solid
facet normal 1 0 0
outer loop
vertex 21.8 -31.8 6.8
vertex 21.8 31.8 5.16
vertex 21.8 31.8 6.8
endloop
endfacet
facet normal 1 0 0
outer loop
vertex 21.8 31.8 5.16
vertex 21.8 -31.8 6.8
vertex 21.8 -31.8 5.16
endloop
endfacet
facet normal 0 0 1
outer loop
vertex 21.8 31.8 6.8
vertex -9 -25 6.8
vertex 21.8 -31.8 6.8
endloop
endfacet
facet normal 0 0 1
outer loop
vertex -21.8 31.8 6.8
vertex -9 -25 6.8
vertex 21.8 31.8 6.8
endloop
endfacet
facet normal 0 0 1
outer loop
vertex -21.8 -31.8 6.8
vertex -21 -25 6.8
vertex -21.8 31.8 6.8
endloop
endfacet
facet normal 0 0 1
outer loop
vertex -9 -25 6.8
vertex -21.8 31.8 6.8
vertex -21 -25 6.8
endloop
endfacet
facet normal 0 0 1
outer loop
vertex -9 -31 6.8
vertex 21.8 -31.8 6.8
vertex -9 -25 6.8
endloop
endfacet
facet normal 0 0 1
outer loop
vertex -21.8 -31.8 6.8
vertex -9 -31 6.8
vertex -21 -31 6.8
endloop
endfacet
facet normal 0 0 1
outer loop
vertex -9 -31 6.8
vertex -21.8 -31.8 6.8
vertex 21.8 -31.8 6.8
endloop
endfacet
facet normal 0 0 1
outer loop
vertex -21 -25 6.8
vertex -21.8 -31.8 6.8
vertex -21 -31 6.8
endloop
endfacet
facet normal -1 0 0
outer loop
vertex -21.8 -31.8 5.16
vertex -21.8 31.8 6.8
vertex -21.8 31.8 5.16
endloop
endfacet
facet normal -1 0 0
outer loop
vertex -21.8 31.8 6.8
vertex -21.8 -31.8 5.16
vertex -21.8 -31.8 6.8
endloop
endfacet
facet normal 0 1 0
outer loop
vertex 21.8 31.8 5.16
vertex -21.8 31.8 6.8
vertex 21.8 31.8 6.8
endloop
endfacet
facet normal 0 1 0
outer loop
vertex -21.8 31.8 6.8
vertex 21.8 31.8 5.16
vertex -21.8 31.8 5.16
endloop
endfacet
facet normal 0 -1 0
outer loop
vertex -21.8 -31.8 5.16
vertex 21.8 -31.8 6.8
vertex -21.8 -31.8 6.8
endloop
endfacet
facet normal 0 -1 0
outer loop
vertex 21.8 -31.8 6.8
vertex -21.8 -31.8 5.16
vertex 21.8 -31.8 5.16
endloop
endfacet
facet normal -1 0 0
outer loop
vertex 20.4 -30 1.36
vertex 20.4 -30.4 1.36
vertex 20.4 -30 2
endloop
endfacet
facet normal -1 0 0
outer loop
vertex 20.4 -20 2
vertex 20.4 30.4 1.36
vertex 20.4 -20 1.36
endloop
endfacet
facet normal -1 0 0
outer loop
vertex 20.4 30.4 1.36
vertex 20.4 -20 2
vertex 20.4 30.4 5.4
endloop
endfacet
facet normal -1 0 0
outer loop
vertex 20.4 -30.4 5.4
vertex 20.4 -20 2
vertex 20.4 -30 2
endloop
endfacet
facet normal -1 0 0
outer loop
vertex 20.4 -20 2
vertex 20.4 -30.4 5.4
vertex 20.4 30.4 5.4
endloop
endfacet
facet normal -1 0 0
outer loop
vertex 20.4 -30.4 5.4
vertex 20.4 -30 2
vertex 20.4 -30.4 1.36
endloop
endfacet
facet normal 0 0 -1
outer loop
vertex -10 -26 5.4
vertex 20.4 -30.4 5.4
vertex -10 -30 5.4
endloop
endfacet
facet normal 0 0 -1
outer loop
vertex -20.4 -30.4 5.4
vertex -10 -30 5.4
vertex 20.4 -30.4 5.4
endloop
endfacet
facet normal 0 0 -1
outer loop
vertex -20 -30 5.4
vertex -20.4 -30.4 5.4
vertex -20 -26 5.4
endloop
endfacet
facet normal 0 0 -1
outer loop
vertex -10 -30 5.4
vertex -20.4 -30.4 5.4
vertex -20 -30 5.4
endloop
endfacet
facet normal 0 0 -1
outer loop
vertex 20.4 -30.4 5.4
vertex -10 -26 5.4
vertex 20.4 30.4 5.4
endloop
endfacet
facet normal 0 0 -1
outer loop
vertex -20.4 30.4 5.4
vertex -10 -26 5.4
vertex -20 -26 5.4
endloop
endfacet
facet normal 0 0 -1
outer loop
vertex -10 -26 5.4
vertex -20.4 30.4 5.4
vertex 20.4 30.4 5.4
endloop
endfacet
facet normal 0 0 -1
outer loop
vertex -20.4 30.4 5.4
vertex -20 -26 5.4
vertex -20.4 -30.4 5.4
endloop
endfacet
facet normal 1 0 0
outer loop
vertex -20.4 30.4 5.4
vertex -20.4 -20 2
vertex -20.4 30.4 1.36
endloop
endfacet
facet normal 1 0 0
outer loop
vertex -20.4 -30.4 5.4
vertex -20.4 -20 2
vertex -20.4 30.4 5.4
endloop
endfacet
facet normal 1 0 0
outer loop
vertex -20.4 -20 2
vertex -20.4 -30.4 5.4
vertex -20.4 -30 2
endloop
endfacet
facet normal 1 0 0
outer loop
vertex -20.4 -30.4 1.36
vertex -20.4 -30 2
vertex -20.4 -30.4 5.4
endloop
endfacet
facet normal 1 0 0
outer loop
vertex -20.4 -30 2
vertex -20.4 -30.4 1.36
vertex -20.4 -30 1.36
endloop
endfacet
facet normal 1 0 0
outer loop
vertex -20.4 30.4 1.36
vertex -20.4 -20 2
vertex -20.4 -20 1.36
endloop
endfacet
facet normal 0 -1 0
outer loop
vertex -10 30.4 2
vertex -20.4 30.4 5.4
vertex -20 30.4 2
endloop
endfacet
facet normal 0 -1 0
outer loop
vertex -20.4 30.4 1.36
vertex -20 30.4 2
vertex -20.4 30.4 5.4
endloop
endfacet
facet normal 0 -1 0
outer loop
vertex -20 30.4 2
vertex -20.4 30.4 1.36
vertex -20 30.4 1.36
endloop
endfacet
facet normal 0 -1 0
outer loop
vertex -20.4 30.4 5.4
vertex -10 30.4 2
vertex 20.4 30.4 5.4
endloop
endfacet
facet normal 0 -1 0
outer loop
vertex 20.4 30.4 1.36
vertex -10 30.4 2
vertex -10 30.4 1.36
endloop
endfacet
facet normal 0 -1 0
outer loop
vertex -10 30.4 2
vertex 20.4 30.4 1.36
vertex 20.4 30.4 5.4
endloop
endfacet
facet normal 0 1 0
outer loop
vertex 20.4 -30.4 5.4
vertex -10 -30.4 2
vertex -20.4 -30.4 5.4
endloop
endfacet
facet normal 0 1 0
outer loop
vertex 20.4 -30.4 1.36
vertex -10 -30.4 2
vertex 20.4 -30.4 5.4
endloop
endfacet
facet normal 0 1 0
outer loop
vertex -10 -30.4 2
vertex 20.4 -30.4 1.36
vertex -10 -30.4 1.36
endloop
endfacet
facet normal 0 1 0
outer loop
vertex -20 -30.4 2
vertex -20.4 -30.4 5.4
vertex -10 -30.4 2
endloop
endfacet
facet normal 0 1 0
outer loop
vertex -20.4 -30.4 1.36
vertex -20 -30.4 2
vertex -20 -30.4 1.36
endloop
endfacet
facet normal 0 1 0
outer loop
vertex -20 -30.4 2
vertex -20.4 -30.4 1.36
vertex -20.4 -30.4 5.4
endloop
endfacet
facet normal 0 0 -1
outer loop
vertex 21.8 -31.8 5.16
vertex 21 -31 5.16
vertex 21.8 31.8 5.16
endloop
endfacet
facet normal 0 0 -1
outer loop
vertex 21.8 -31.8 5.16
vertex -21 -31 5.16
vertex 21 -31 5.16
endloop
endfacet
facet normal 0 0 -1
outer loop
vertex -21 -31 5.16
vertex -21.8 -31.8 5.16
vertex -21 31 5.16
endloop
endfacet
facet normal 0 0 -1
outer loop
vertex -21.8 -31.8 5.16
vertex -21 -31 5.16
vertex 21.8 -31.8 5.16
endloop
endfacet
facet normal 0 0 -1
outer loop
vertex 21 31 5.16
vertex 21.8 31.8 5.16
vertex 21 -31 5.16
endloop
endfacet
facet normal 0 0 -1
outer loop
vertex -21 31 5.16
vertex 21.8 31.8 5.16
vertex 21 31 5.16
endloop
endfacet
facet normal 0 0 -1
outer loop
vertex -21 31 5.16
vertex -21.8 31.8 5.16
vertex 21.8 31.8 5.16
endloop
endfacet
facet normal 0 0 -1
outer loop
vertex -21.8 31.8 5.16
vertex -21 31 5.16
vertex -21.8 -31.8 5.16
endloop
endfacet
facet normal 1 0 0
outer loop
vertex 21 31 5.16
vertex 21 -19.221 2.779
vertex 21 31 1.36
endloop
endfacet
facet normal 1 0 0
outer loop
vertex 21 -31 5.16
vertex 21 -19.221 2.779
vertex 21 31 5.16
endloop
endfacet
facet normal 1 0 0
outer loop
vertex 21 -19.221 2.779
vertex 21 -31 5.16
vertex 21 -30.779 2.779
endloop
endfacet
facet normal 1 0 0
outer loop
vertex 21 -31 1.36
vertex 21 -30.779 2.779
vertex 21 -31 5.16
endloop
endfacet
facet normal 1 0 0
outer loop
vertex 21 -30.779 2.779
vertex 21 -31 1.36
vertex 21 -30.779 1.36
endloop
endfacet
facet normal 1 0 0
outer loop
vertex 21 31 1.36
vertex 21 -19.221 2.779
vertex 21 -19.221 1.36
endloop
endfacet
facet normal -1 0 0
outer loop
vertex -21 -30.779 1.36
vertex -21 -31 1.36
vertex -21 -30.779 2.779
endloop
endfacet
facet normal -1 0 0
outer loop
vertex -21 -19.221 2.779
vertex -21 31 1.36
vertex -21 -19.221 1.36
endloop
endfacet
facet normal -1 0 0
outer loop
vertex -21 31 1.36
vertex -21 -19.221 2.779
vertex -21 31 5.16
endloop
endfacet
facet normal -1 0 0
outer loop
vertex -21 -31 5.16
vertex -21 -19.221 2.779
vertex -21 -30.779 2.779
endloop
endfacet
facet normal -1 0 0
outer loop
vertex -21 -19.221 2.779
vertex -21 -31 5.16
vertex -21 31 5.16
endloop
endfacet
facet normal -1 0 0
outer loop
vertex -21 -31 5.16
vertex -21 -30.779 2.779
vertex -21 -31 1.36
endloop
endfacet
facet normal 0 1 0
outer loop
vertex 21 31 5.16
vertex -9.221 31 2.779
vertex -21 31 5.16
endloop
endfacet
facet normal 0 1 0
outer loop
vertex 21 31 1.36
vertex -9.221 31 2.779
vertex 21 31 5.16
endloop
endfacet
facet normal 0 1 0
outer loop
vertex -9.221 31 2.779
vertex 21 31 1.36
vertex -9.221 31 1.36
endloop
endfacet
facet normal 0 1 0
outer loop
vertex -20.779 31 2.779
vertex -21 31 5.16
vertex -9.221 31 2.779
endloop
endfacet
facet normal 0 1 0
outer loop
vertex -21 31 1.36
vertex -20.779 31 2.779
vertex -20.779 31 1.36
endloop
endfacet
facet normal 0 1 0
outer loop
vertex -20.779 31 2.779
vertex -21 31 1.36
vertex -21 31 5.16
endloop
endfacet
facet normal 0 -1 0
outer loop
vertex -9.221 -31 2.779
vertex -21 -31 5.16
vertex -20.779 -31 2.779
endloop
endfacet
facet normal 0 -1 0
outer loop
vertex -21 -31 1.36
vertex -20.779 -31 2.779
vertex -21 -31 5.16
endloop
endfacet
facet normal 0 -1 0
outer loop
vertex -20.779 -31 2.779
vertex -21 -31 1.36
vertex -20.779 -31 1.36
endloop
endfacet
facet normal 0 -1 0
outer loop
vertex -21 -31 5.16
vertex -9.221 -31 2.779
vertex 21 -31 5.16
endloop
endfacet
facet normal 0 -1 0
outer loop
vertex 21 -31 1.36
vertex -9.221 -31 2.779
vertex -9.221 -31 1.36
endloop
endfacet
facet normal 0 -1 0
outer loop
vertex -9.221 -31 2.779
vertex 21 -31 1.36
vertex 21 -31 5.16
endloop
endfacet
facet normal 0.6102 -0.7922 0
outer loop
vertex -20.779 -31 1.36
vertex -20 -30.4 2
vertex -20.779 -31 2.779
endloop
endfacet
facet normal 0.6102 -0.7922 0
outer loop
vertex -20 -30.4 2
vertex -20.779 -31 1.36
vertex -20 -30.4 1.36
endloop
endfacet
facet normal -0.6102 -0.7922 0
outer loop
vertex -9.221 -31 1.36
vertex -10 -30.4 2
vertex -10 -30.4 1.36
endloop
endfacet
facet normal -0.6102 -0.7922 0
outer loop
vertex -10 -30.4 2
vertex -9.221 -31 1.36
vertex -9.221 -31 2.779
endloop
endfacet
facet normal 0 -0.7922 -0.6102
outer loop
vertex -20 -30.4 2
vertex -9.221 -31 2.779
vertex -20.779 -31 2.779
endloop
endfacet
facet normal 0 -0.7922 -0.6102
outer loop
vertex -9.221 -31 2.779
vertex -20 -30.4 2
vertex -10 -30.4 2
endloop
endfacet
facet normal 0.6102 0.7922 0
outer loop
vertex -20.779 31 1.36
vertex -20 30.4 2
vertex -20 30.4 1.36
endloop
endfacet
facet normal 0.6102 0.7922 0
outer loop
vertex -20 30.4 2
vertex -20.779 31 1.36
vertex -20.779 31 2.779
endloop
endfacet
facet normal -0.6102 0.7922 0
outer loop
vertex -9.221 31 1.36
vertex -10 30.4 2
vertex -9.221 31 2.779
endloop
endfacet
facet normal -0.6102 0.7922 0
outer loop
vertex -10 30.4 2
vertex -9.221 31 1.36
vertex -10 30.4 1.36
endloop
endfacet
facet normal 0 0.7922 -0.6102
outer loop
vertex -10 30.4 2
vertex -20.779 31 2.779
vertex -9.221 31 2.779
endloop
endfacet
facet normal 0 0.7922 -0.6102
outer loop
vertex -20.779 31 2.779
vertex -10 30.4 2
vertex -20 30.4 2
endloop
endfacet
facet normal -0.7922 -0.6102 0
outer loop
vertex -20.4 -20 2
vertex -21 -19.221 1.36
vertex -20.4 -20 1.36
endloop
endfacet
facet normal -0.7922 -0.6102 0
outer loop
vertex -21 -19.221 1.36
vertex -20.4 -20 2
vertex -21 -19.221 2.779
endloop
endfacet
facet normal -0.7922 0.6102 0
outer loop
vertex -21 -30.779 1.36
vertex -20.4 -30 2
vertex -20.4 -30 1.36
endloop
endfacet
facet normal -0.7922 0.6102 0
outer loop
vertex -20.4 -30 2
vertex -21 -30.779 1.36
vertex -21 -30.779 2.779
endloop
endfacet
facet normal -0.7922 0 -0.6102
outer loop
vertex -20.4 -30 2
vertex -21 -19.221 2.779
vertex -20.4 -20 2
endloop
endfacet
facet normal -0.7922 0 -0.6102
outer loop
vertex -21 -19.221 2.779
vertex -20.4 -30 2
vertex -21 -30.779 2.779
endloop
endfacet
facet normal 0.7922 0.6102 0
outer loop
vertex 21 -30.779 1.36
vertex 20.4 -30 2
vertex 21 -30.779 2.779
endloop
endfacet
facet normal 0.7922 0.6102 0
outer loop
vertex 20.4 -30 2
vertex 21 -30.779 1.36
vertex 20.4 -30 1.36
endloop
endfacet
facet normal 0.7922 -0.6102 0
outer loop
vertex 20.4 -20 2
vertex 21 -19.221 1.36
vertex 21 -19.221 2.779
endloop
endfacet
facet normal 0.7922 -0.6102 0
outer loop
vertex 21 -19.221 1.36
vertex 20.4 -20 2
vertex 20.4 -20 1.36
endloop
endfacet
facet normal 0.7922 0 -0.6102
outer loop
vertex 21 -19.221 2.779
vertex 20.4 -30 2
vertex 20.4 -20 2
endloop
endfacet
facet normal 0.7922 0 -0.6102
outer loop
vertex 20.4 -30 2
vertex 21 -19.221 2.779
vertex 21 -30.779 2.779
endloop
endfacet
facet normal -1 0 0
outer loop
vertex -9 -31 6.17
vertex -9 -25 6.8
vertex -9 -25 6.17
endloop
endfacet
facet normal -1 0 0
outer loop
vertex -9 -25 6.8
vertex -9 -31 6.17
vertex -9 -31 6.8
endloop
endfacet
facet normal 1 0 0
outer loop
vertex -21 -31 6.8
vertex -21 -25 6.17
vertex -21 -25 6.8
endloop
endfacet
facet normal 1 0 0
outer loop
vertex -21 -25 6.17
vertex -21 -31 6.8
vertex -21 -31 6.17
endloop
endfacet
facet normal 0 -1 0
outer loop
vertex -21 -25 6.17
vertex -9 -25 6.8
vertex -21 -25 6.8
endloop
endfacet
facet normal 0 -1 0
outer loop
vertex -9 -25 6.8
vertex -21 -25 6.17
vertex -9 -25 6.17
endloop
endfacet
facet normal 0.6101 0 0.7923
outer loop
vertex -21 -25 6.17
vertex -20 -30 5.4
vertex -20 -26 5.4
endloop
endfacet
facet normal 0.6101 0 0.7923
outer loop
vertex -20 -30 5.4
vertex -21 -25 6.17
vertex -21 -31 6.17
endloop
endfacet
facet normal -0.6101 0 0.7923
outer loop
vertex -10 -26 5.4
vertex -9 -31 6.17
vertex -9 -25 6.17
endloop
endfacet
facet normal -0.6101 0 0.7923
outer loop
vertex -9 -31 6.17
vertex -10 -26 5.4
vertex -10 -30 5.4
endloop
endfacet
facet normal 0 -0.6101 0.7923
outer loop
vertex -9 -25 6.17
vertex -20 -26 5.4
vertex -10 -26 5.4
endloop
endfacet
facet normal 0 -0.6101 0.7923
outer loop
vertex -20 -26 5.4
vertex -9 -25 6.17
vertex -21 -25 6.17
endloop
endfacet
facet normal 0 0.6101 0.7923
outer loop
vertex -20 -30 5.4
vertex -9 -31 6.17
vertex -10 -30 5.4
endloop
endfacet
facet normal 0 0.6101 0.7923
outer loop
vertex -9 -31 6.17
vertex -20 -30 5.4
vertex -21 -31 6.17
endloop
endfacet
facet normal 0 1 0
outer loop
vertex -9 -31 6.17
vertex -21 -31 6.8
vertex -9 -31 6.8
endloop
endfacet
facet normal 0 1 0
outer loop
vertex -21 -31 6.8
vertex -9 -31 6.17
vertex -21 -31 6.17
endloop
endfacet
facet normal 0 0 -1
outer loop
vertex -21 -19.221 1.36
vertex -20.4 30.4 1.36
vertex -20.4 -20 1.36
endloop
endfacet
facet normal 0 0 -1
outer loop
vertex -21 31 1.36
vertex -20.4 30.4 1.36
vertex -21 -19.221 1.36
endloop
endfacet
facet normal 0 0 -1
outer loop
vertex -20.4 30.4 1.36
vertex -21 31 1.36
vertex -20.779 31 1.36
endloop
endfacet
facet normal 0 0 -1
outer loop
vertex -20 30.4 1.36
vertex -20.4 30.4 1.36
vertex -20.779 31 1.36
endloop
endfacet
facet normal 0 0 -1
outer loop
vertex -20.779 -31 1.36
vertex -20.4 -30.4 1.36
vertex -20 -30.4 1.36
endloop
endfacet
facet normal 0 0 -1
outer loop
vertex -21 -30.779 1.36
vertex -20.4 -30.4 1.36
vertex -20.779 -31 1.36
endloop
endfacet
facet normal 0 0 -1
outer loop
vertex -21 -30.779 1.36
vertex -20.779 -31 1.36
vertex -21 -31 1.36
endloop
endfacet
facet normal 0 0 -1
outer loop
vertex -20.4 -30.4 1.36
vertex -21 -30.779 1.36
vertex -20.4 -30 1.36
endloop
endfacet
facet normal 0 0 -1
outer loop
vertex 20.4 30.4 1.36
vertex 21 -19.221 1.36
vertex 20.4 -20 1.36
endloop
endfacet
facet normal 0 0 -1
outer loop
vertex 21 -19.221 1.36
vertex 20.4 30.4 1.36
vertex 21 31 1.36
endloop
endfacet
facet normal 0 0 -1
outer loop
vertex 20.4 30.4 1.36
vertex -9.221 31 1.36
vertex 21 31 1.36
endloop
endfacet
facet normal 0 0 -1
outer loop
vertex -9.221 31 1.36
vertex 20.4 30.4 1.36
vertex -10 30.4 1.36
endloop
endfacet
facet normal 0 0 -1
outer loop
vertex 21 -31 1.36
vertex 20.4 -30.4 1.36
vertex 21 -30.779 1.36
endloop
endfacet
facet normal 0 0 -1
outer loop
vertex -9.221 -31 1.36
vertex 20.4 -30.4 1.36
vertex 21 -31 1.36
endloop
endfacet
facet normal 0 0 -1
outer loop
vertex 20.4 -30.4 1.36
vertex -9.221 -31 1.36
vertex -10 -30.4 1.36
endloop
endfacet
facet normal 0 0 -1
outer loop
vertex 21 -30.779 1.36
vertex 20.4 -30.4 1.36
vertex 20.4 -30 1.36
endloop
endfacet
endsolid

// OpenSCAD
// file: parameterized_box.scad
$fn = 16;

/*
// Wall thickness
WALL    = 2;

// Object dimensions
OBJECT  = [40,60,10];

// Distance between Object and Wall
PADDING = [0.4,0.4,0.4]; 

// Ratio between cover and case
COVER_RATIO = 0.3;

// Height of the rim
RIM_HEIGHT = 4;

// Gap for the Rim
RIM_GAP = 0.2;

// Radius of mountholes
MNT_RADIUS = 1.5;

// X/Y distance from wall for mountholes
MNT_LOC_X = 3;
MNT_LOC_Y = 3;

// Mount hole height
MNT_HEIGHT = 3;


Define openings as matrix. Each line is on opening defined as

[DIMENSION,LOCATION,WALL]

DIMENSION:  defined as [X,Y,Z] values for the opening on the front of the object,
            before being rotated to fit on a wall other than the front.
LOCATION:   the distance of the lower left point of the opening from the lower
            left front of the object.
WALL:       the wall the opening is moved to:
            0: Front
            1: Back
            2: Left
            3: Right
            4: Top
            5: Bottom

OPENINGS = [[[10,WALL,4],[0,0,0],0],
            [[10,WALL,4],[0,0,0],1],
            [[10,WALL,4],[0,0,0],2],
            [[10,WALL,4],[0,0,0],3],
            [[10,WALL,4],[0,0,0],4],
            [[10,WALL,4],[0,0,0],5]
           ];
           


OPENINGS = [[[10,WALL,4],[0,0,0],0],
            [[10,WALL,4],[0,0,0],1]
           ];

*/

// calculate outside dimensions
OBJECT_BOX = OBJECT + 2 * PADDING + 2 * [WALL, WALL, WALL]; 

// calculate rim thickness
RIM_THICKNESS = (WALL - RIM_GAP)/2;


module outside_rim(){
    translate([0,0,(OBJECT_BOX[2]/2 - RIM_HEIGHT/2) - COVER_RATIO * OBJECT_BOX[2] + RIM_HEIGHT]){
        difference(){
            cube([OBJECT_BOX[0], OBJECT_BOX[1], RIM_HEIGHT], center = true);
            cube([OBJECT_BOX[0] - (WALL - RIM_GAP), 
                  OBJECT_BOX[1] - (WALL - RIM_GAP),
                  RIM_HEIGHT], center = true);
        }
    }
}


module inside_rim(){
    translate([0,0,(OBJECT_BOX[2]/2 - RIM_HEIGHT/2) - (COVER_RATIO * OBJECT_BOX[2]) + RIM_HEIGHT - RIM_GAP]){
        difference(){
            cube([OBJECT_BOX[0], OBJECT_BOX[1], RIM_HEIGHT], center = true);
            cube([OBJECT_BOX[0] - (WALL + RIM_GAP), 
                  OBJECT_BOX[1] - (WALL + RIM_GAP),
                  RIM_HEIGHT], center = true);
        }
    }
}


module case_bottom(){
    // cut openings into upper part
    difference(){
        // lower part with rim
        union(){
            outside_rim();
            // cut off the upper part by COVER_RATIO
            difference(){
                case();
                translate([0,0,OBJECT_BOX[2]/2 - COVER_RATIO * OBJECT_BOX[2]/2])
                    scale([1,1,COVER_RATIO])
                        cube(OBJECT_BOX, center = true);
            }
        }
        create_openings(OPENINGS);
    }
    mount_holes();
}


module case_top(){
    // cut off the lower part by COVER_RATIO, create openings and a rim
    difference(){
        case();
        translate([0,0,- OBJECT_BOX[2]/2 + (1 - COVER_RATIO) * OBJECT_BOX[2]/2])
            scale([1,1,1 - COVER_RATIO])
                cube(OBJECT_BOX, center = true);
        inside_rim();
        create_openings(OPENINGS);
    }
}


module case(){
    difference(){
        cube(OBJECT_BOX, center = true);
        cube(OBJECT_BOX - 2 * [WALL,WALL,WALL], center = true);
    }
}




module create_openings(OPENINGS){
    module draw_opening(X_ZERO_LOC, Y_ZERO_LOC, Z_ZERO_LOC, DIMENSION, LOCATION, ROTATION){
        translate([X_ZERO_LOC, Y_ZERO_LOC, Z_ZERO_LOC])
                translate(LOCATION)
                    rotate(ROTATION){
                        hull(){
                        cube(DIMENSION, center = true);
                        translate([0,- DIMENSION[1] + WALL/2, 0])
                            cube([DIMENSION[0] + 2, WALL - 0.1 * WALL, DIMENSION[2] + 2],center = true);
                        }
                    }
    }

    for (OPENING = [0:len(OPENINGS)-1]) {
        DIMENSION   = OPENINGS[OPENING][0];
        LOCATION    = OPENINGS[OPENING][1];
        POSITION    = OPENINGS[OPENING][2];
        
        
        echo(POSITION);
        
        // front
        if (POSITION == 0) {
            X_ZERO_LOC  = - (OBJECT[0]/2 - DIMENSION[0]/2);
            Y_ZERO_LOC  = - (OBJECT_BOX[1]/2 - DIMENSION[1]/2);
            Z_ZERO_LOC  = - (OBJECT[2]/2 - DIMENSION[2]/2) + MNT_HEIGHT;
            ROTATION    = [0,0,0];
            
            draw_opening(X_ZERO_LOC, Y_ZERO_LOC, Z_ZERO_LOC, DIMENSION, LOCATION, ROTATION);
        }
        
        //back
        if (POSITION == 1) {
            X_ZERO_LOC  = - (OBJECT[0]/2 - DIMENSION[0]/2);
            Y_ZERO_LOC  = (OBJECT_BOX[1]/2 - DIMENSION[1]/2);
            Z_ZERO_LOC  = - (OBJECT[2]/2 - DIMENSION[2]/2) + MNT_HEIGHT;
            ROTATION    = [0,0,180];
            
            draw_opening(X_ZERO_LOC, Y_ZERO_LOC, Z_ZERO_LOC, DIMENSION, LOCATION, ROTATION);
        }
        
        // left
        if (POSITION == 2) {
            X_ZERO_LOC  = - (OBJECT_BOX[0]/2 - DIMENSION[1]/2);
            Y_ZERO_LOC  = - (OBJECT[1]/2 - DIMENSION[0]/2);
            Z_ZERO_LOC  = - (OBJECT[2]/2 - DIMENSION[2]/2) + MNT_HEIGHT;
            ROTATION    = [180,0,90];
            
            draw_opening(X_ZERO_LOC, Y_ZERO_LOC, Z_ZERO_LOC, DIMENSION, LOCATION, ROTATION);
        }
        
        // right
        if (POSITION == 3) {
            X_ZERO_LOC  = (OBJECT_BOX[0]/2 - DIMENSION[1]/2);
            Y_ZERO_LOC  = - (OBJECT[1]/2 - DIMENSION[0]/2);
            Z_ZERO_LOC  = - (OBJECT[2]/2 - DIMENSION[2]/2) + MNT_HEIGHT;
            ROTATION    = [0,0,90];
            
            draw_opening(X_ZERO_LOC, Y_ZERO_LOC, Z_ZERO_LOC, DIMENSION, LOCATION, ROTATION);
        }
        
        // top
        if (POSITION == 4) {
            X_ZERO_LOC  = - (OBJECT[0]/2 - DIMENSION[0]/2);
            Y_ZERO_LOC  = - (OBJECT[1]/2 - DIMENSION[2]/2);
            Z_ZERO_LOC  = (OBJECT_BOX[2]/2 - DIMENSION[1]/2);
            ROTATION    = [90,180,0];
            
            draw_opening(X_ZERO_LOC, Y_ZERO_LOC, Z_ZERO_LOC, DIMENSION, LOCATION, ROTATION);
        }
        
        // bottom
        if (POSITION == 5) {
            X_ZERO_LOC  = - (OBJECT[0]/2 - DIMENSION[0]/2);
            Y_ZERO_LOC  = - (OBJECT[1]/2 - DIMENSION[2]/2);
            Z_ZERO_LOC  = - (OBJECT_BOX[2]/2 - DIMENSION[1]/2);
            ROTATION    = [90,0,0];
            
            draw_opening(X_ZERO_LOC, Y_ZERO_LOC, Z_ZERO_LOC, DIMENSION, LOCATION, ROTATION);
        }
    }
}

module mount_hole(X,Y,Z){
    translate([X,Y,Z])
        difference(){
            cylinder(MNT_HEIGHT, MNT_RADIUS + 1.2, MNT_RADIUS + 0.6, center = true);
            cylinder(MNT_HEIGHT, MNT_RADIUS, MNT_RADIUS, center = true);
        }
}


module mount_holes(){
    MNT_X = (OBJECT[0] - MNT_RADIUS)/2 - MNT_LOC_X;
    MNT_Y = (OBJECT[1] - MNT_RADIUS)/2 - MNT_LOC_Y;
    MNT_Z = - (OBJECT_BOX[2] - MNT_HEIGHT)/2 + WALL;
    
    // front left
    mount_hole(- MNT_X, - MNT_Y, MNT_Z);
    
    // front right
    mount_hole(MNT_X, - MNT_Y, MNT_Z);
    
    // back left
    mount_hole(- MNT_X, MNT_Y, MNT_Z);
    
    // front left
    mount_hole(MNT_X, MNT_Y, MNT_Z);
}
// main file
$fn = 16;


// Wall thickness
WALL    = 1.4;

// Object dimensions
OBJECT  = [40,60,10];

// Distance between Object and Wall
PADDING = [0.4,0.4,0.4]; 

// Ratio between cover and case
COVER_RATIO = 0.4;

// Height of the rim
RIM_HEIGHT = 4;

// Gap for the Rim
RIM_GAP = 0.2;

// Radius of mountholes
MNT_RADIUS = 1.5;

// X/Y distance from wall for mountholes
MNT_LOC_X = 3;
MNT_LOC_Y = 3;

// Mount hole height
MNT_HEIGHT = 3;

/*
Define openings as matrix. Each line is on opening defined as

[DIMENSION,LOCATION,WALL]

DIMENSION:  defined as [X,Y,Z] values for the opening on the front of the object,
            before being rotated to fit on a wall other than the front.
LOCATION:   the distance of the lower left point of the opening from the lower
            left front of the object.
WALL:       the wall the opening is moved to:
            0: Front
            1: Back
            2: Left
            3: Right
            4: Top
            5: Bottom

*/

OPENINGS = [[[10,WALL,4],[0,0,0],0],
            [[10,WALL,4],[0,0,0],1],
            [[10,WALL,4],[0,0,0],2],
            [[10,WALL,4],[0,0,0],3],
            [[10,WALL,4],[0,0,0],4],
            [[10,WALL,4],[0,0,0],5]
           ];          


/*OPENINGS = [[[10,WALL,4],[0,0,0],0],
            [[10,WALL,4],[0,0,0],1]
           ];*/

include <parameterized_box.scad>

// choose what to render. The entry without "*" is rendered.
case_top();
*case_bottom();
